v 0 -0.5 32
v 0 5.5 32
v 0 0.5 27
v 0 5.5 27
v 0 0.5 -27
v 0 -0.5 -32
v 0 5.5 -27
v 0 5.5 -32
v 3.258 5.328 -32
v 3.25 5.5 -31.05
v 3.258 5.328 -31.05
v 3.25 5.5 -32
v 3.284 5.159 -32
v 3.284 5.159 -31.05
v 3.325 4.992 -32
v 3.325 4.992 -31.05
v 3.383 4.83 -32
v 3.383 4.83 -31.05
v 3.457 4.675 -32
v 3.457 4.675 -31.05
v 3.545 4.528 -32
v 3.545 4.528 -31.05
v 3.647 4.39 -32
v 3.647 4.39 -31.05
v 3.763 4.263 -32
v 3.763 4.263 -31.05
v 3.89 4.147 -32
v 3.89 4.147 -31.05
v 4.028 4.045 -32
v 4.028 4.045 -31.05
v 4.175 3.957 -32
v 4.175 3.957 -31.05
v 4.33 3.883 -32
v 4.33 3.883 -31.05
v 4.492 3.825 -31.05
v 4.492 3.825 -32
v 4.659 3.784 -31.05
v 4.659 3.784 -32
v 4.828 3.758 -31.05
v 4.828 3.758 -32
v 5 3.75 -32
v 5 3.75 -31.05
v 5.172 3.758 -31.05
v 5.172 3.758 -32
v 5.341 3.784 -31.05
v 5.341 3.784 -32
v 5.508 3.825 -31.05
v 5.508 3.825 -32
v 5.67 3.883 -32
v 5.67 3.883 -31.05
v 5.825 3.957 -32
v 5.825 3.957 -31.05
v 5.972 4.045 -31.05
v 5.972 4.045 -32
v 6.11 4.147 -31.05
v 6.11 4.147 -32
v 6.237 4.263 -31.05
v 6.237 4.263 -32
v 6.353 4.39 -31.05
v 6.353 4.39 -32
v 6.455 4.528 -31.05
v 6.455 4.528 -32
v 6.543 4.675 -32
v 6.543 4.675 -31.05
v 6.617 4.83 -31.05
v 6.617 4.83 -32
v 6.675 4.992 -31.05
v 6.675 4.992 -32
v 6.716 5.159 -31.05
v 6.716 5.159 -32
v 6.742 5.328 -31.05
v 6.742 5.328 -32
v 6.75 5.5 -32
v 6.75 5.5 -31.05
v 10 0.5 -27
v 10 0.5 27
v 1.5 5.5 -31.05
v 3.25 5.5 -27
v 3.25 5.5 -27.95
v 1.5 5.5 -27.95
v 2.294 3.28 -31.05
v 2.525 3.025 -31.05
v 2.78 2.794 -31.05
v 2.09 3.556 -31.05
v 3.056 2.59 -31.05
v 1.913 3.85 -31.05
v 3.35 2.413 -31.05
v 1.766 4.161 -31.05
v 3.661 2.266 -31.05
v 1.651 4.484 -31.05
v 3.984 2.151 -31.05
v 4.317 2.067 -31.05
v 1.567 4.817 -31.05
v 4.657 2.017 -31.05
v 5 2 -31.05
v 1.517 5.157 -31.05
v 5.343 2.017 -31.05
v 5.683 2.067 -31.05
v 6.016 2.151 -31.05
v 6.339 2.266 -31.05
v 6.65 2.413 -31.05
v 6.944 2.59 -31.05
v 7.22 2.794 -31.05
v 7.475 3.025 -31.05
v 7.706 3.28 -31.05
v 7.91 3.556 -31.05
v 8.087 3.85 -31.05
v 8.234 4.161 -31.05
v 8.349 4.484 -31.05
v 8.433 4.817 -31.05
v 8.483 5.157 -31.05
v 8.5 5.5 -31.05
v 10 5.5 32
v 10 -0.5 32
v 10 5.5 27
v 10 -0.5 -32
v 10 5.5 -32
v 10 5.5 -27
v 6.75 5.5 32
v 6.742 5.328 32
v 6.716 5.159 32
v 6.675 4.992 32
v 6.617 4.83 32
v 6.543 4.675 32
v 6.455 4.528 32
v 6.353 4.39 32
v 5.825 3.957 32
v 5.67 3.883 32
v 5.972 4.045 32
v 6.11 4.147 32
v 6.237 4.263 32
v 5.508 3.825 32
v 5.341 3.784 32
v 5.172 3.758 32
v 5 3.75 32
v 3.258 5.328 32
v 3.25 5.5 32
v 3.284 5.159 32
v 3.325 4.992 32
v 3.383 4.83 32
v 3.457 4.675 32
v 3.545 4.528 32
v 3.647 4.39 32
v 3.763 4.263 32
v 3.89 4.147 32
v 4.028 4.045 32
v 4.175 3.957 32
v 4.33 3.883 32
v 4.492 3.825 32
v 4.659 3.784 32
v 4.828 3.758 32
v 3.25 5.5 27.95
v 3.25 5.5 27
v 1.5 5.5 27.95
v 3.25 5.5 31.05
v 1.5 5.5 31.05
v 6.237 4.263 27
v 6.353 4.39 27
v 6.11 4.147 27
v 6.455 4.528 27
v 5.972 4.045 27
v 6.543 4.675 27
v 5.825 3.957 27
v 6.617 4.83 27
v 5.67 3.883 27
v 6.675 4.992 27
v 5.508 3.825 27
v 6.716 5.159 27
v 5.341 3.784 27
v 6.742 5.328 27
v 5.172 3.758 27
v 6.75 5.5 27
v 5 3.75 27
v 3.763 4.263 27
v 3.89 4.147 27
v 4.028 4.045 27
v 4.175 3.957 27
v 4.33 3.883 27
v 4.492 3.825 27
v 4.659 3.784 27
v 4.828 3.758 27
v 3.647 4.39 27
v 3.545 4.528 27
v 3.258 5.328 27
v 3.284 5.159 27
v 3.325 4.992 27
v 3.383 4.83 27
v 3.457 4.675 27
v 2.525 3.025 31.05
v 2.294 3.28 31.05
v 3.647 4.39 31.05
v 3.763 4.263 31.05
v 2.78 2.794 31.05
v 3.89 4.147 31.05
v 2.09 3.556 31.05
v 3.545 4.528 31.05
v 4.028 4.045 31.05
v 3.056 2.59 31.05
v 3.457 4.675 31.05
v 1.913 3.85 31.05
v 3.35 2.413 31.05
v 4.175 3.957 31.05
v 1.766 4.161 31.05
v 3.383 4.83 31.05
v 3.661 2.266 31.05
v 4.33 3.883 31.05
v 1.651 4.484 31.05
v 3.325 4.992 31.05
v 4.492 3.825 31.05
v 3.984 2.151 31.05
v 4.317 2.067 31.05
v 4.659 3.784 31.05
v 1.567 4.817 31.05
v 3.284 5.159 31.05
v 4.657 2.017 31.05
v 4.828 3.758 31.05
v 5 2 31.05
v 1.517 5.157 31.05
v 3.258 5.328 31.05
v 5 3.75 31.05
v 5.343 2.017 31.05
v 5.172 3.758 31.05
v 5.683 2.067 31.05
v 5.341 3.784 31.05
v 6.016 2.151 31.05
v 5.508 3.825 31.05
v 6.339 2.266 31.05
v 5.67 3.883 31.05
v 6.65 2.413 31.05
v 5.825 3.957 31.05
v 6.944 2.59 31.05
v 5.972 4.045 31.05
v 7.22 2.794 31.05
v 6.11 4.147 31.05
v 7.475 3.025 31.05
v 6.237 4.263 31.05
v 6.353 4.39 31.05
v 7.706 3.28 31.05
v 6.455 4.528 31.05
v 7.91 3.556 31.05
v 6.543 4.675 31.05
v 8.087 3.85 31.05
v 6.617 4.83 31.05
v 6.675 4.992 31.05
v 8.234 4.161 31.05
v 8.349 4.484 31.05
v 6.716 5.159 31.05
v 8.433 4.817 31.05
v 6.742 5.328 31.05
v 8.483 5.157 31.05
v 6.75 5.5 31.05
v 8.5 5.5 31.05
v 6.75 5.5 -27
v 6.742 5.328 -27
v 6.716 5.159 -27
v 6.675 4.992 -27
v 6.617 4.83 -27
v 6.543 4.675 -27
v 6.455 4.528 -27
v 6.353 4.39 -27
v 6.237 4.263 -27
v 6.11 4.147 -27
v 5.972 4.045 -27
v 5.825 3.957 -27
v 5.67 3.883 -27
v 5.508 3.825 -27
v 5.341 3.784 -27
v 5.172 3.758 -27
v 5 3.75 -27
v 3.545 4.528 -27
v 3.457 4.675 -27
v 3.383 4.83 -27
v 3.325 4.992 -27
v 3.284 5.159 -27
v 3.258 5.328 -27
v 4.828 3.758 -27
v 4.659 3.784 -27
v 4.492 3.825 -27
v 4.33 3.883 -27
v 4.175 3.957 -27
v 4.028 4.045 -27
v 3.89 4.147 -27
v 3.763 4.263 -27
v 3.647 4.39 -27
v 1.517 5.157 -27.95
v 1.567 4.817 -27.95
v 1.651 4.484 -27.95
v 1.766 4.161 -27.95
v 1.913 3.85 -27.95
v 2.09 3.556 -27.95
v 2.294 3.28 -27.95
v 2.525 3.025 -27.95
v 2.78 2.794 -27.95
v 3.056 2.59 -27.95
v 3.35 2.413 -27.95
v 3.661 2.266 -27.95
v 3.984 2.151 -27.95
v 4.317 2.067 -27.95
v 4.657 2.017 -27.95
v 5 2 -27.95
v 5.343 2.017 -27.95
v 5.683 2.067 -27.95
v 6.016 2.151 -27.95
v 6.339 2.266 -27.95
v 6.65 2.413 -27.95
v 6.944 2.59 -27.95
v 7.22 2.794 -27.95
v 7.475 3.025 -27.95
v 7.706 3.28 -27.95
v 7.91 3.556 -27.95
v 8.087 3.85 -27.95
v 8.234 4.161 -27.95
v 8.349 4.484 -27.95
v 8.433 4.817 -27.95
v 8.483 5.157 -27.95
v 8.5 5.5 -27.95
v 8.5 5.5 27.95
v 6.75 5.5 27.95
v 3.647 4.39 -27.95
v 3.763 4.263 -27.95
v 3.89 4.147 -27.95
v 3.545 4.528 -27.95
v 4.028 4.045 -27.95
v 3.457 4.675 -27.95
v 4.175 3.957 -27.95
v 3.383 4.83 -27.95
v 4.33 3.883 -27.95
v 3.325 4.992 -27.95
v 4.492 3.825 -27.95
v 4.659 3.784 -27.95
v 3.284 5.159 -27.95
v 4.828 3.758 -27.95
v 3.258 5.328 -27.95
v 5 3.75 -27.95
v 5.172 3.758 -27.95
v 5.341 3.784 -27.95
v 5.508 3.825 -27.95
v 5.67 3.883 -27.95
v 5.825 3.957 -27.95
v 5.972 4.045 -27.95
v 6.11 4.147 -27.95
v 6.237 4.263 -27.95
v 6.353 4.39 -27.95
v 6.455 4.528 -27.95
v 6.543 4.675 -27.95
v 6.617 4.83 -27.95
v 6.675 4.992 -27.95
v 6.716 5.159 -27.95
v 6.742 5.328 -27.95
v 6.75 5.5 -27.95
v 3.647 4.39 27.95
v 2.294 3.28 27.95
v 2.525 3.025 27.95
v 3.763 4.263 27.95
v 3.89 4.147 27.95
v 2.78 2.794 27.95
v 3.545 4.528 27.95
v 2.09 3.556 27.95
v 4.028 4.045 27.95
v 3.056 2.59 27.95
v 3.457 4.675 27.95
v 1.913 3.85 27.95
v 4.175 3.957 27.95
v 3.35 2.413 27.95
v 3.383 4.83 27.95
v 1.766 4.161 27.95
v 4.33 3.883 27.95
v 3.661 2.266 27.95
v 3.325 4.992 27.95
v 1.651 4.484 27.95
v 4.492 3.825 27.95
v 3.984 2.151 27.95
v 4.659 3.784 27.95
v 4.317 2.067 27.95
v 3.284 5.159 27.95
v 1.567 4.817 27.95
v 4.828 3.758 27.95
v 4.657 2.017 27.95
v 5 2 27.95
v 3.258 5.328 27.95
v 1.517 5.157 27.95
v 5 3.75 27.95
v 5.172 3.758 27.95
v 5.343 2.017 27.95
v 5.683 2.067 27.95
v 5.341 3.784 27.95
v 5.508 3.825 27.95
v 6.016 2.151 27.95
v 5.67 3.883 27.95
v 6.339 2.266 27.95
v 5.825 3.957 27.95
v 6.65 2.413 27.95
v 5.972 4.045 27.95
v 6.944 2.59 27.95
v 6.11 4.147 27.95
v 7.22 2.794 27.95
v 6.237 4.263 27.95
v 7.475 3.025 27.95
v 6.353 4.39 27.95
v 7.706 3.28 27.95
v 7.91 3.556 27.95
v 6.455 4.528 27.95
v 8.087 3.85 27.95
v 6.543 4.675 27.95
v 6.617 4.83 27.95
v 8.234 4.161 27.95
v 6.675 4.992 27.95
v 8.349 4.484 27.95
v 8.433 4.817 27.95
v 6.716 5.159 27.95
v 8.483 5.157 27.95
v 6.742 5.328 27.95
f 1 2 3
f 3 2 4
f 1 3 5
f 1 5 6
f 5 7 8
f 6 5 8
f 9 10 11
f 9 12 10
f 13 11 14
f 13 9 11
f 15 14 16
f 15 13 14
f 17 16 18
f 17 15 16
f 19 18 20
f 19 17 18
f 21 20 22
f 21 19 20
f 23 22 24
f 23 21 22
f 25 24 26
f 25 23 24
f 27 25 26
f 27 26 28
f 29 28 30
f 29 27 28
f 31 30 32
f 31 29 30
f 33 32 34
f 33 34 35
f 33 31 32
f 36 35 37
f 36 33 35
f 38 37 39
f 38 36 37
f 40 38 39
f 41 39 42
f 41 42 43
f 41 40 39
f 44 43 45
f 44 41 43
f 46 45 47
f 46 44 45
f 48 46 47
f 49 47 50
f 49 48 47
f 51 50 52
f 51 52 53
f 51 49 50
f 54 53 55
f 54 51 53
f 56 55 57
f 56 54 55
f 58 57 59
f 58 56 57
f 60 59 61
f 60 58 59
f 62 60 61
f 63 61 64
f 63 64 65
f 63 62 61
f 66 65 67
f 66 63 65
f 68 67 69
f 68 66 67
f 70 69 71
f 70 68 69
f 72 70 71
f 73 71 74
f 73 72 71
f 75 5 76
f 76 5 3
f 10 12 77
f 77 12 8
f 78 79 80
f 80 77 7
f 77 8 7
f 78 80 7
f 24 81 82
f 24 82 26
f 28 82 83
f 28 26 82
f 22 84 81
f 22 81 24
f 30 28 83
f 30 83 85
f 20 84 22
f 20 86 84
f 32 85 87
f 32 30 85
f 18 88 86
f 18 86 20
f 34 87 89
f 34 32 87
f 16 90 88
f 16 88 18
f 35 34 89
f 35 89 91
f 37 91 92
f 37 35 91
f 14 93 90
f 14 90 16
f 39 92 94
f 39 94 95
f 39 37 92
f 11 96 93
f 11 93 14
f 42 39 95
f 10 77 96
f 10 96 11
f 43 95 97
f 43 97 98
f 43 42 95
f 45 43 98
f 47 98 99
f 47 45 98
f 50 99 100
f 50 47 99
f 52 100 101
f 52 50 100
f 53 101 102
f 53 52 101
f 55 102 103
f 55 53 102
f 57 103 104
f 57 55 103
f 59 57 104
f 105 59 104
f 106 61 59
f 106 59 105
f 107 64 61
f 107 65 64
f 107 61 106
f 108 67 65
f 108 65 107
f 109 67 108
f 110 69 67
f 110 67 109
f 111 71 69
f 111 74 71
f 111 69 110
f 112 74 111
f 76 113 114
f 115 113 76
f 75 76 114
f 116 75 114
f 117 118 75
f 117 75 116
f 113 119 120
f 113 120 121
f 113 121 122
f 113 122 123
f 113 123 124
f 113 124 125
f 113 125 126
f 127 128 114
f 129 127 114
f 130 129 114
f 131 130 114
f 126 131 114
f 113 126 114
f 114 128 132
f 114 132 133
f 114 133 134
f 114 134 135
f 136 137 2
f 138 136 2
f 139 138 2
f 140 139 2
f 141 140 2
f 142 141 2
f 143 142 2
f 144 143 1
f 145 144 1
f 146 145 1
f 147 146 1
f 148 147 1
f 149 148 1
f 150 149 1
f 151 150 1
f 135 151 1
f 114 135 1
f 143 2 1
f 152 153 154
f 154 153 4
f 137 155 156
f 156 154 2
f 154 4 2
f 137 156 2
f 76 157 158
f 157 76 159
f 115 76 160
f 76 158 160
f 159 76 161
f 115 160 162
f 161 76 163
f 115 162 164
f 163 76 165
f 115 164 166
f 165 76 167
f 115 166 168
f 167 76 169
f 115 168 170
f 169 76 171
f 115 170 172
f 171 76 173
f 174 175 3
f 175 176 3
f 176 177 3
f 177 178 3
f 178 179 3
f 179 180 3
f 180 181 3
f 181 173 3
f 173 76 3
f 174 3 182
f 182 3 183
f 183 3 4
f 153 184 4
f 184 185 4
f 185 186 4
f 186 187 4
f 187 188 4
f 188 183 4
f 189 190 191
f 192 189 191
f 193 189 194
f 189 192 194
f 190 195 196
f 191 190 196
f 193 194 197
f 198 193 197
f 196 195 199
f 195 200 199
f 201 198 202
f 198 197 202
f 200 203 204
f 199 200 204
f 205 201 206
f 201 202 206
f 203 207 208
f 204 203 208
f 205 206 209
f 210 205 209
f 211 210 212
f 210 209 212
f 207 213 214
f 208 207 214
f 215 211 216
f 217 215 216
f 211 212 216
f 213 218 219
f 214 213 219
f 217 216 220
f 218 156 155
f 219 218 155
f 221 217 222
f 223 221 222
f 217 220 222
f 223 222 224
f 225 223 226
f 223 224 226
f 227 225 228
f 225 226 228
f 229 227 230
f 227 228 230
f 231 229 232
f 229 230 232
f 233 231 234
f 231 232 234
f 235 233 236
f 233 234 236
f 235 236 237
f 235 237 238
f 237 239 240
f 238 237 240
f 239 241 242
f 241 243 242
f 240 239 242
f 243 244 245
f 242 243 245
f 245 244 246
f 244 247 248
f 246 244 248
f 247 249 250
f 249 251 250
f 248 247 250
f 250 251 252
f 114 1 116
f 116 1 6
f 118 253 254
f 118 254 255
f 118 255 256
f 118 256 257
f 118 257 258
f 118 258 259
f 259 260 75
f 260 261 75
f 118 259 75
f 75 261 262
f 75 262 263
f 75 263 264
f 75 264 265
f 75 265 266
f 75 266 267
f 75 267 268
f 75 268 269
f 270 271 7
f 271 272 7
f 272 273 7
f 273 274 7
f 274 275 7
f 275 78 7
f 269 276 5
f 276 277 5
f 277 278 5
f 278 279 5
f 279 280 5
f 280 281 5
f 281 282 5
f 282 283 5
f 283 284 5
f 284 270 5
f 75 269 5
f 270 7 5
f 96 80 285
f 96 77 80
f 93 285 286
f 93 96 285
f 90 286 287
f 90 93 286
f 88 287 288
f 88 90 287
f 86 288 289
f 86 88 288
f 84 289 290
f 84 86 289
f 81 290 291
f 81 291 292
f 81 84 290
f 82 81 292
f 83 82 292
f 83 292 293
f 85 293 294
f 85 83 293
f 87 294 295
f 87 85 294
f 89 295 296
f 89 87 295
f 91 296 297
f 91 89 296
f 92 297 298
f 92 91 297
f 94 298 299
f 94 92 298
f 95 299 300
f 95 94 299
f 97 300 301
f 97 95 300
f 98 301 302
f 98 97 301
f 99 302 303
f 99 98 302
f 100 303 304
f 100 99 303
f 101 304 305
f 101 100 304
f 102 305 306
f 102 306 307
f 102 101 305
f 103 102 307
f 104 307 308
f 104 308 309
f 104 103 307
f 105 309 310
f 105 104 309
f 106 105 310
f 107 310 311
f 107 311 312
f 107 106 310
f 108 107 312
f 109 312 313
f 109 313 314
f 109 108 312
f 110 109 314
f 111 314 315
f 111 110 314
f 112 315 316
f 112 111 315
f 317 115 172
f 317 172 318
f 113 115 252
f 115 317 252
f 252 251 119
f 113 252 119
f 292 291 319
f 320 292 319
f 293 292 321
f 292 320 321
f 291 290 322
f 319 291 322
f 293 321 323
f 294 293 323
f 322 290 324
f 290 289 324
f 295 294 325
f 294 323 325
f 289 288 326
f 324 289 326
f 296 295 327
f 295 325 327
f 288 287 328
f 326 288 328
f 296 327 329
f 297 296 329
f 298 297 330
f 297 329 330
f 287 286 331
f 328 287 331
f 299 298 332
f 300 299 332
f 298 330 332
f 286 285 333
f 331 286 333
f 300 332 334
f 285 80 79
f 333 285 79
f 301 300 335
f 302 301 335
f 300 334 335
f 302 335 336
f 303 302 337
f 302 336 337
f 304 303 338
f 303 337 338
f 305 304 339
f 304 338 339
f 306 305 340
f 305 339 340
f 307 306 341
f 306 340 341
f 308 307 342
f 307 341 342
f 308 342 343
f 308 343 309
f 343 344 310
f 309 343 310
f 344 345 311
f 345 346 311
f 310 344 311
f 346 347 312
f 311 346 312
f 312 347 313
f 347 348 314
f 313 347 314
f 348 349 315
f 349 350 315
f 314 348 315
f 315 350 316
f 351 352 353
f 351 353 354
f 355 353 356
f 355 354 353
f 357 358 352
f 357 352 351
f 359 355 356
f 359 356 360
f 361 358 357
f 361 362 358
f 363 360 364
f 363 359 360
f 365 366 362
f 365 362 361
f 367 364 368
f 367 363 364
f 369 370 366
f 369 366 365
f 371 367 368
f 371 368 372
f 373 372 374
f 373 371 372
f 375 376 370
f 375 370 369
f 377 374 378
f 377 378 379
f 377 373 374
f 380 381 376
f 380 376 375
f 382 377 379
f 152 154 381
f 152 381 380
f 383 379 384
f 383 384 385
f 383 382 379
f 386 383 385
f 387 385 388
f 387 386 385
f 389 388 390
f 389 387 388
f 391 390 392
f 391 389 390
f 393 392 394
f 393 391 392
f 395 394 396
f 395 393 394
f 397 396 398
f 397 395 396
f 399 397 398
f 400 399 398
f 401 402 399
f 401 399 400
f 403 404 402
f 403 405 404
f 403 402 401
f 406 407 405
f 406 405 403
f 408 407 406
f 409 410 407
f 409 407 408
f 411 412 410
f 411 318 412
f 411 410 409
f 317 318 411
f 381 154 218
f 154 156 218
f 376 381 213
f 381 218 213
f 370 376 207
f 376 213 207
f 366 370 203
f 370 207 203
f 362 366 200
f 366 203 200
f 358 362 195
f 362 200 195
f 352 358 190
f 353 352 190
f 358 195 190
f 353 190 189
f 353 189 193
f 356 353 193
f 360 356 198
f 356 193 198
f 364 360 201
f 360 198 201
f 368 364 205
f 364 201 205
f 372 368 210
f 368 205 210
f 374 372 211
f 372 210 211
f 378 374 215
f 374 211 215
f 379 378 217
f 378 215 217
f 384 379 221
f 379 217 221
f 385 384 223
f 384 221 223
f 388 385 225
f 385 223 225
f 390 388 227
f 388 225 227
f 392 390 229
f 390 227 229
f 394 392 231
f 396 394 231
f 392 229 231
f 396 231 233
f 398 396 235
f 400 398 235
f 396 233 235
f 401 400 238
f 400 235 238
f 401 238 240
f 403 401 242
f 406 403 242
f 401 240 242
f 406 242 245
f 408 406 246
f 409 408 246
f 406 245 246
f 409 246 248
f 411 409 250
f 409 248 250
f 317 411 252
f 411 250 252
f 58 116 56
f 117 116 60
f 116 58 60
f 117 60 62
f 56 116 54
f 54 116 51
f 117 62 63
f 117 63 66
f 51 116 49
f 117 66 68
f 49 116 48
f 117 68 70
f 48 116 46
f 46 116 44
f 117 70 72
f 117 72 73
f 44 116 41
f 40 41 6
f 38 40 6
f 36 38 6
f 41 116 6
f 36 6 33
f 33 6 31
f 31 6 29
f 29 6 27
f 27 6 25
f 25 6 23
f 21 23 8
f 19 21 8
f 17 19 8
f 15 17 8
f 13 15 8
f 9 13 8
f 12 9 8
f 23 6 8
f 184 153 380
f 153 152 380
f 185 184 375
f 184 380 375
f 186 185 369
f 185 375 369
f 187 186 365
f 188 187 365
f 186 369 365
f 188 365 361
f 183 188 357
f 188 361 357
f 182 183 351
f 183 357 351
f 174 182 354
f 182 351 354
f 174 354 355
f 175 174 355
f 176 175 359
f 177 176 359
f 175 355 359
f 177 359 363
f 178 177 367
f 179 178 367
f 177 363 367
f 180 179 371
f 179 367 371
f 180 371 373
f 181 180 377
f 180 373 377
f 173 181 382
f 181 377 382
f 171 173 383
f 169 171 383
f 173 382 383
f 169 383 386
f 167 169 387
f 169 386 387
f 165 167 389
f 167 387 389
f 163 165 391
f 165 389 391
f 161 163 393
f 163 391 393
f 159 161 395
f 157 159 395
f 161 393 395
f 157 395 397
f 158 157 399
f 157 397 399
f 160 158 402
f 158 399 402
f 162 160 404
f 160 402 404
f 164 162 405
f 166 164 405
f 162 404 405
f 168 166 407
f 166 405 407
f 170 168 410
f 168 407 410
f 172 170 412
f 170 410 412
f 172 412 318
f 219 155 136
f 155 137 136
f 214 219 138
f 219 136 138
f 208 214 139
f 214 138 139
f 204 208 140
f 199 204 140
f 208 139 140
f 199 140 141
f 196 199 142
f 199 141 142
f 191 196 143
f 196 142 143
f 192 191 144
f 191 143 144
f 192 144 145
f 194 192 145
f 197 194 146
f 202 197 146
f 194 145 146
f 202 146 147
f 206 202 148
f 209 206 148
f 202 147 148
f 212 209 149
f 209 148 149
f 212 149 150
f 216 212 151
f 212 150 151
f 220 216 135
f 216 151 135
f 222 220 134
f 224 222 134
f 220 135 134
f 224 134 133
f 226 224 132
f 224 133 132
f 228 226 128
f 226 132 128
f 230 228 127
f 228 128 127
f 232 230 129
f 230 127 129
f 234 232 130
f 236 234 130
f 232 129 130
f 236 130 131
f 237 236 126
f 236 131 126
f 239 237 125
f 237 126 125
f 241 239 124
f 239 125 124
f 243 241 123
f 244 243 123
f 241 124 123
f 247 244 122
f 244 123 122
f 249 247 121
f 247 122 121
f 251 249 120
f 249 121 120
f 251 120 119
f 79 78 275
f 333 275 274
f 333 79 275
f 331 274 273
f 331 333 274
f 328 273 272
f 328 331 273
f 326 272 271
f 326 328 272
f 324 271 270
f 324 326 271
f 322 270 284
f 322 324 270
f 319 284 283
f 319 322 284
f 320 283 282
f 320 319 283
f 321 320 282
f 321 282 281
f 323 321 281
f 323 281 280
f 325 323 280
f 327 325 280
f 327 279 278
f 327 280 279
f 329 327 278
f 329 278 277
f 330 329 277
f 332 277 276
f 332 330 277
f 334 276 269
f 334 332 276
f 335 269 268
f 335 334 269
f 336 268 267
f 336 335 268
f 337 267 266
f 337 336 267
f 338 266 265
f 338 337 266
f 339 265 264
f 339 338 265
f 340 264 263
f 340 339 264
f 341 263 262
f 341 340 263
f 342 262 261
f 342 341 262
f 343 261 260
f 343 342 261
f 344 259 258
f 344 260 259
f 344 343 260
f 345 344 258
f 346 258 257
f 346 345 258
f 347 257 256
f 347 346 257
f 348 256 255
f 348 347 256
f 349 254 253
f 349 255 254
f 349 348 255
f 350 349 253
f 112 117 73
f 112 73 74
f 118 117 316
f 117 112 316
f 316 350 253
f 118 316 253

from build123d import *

# Parameters (mm, degrees)
BOSS_EXTRUDE1_DEPTH = 10
SKETCH2_R           = 3.5
SKETCH2_R_2         = 1.75
CUT_EXTRUDE1_DEPTH  = 1.55
SKETCH2_2_R         = 1.75
CUT_EXTRUDE2_DEPTH  = 6.6


with BuildPart() as part:
    # Sketch1 → Boss-Extrude1 (new body)
    with BuildSketch(Plane(origin=(0, 0, 0), x_dir=(0, 0, -1), z_dir=(1, 0, 0))):
        Polygon((-32, 5.5), (-32, -0.5), (32, -0.5), (32, 5.5), (27, 5.5), (27, 0.5), (-27, 0.5), (-27, 5.5), align=None)
    extrude(amount=BOSS_EXTRUDE1_DEPTH)

    # Sketch2 → Cut-Extrude1 (cut, symmetric)
    with BuildSketch(Plane.XY.offset(29.5)):
        with Locations((5, 5.5)):
            Circle(SKETCH2_R)
        with Locations((5, 5.5)):
            Circle(SKETCH2_R_2, mode=Mode.SUBTRACT)
    cut_extrude1 = extrude(amount=CUT_EXTRUDE1_DEPTH, both=True, mode=Mode.SUBTRACT)

    # Sketch2<2> → Cut-Extrude2 (cut, symmetric)
    with BuildSketch(Plane.XY.offset(29.5)):
        with Locations((5, 5.5)):
            Circle(SKETCH2_2_R)
    cut_extrude2 = extrude(amount=CUT_EXTRUDE2_DEPTH, both=True, mode=Mode.SUBTRACT)

    # Mirror1: Cut-Extrude1 across plane
    add(cut_extrude1.mirror(Plane.XY), mode=Mode.SUBTRACT)

    # Mirror2: Cut-Extrude2 across plane
    add(cut_extrude2.mirror(Plane.XY), mode=Mode.SUBTRACT)


solid = part.part
